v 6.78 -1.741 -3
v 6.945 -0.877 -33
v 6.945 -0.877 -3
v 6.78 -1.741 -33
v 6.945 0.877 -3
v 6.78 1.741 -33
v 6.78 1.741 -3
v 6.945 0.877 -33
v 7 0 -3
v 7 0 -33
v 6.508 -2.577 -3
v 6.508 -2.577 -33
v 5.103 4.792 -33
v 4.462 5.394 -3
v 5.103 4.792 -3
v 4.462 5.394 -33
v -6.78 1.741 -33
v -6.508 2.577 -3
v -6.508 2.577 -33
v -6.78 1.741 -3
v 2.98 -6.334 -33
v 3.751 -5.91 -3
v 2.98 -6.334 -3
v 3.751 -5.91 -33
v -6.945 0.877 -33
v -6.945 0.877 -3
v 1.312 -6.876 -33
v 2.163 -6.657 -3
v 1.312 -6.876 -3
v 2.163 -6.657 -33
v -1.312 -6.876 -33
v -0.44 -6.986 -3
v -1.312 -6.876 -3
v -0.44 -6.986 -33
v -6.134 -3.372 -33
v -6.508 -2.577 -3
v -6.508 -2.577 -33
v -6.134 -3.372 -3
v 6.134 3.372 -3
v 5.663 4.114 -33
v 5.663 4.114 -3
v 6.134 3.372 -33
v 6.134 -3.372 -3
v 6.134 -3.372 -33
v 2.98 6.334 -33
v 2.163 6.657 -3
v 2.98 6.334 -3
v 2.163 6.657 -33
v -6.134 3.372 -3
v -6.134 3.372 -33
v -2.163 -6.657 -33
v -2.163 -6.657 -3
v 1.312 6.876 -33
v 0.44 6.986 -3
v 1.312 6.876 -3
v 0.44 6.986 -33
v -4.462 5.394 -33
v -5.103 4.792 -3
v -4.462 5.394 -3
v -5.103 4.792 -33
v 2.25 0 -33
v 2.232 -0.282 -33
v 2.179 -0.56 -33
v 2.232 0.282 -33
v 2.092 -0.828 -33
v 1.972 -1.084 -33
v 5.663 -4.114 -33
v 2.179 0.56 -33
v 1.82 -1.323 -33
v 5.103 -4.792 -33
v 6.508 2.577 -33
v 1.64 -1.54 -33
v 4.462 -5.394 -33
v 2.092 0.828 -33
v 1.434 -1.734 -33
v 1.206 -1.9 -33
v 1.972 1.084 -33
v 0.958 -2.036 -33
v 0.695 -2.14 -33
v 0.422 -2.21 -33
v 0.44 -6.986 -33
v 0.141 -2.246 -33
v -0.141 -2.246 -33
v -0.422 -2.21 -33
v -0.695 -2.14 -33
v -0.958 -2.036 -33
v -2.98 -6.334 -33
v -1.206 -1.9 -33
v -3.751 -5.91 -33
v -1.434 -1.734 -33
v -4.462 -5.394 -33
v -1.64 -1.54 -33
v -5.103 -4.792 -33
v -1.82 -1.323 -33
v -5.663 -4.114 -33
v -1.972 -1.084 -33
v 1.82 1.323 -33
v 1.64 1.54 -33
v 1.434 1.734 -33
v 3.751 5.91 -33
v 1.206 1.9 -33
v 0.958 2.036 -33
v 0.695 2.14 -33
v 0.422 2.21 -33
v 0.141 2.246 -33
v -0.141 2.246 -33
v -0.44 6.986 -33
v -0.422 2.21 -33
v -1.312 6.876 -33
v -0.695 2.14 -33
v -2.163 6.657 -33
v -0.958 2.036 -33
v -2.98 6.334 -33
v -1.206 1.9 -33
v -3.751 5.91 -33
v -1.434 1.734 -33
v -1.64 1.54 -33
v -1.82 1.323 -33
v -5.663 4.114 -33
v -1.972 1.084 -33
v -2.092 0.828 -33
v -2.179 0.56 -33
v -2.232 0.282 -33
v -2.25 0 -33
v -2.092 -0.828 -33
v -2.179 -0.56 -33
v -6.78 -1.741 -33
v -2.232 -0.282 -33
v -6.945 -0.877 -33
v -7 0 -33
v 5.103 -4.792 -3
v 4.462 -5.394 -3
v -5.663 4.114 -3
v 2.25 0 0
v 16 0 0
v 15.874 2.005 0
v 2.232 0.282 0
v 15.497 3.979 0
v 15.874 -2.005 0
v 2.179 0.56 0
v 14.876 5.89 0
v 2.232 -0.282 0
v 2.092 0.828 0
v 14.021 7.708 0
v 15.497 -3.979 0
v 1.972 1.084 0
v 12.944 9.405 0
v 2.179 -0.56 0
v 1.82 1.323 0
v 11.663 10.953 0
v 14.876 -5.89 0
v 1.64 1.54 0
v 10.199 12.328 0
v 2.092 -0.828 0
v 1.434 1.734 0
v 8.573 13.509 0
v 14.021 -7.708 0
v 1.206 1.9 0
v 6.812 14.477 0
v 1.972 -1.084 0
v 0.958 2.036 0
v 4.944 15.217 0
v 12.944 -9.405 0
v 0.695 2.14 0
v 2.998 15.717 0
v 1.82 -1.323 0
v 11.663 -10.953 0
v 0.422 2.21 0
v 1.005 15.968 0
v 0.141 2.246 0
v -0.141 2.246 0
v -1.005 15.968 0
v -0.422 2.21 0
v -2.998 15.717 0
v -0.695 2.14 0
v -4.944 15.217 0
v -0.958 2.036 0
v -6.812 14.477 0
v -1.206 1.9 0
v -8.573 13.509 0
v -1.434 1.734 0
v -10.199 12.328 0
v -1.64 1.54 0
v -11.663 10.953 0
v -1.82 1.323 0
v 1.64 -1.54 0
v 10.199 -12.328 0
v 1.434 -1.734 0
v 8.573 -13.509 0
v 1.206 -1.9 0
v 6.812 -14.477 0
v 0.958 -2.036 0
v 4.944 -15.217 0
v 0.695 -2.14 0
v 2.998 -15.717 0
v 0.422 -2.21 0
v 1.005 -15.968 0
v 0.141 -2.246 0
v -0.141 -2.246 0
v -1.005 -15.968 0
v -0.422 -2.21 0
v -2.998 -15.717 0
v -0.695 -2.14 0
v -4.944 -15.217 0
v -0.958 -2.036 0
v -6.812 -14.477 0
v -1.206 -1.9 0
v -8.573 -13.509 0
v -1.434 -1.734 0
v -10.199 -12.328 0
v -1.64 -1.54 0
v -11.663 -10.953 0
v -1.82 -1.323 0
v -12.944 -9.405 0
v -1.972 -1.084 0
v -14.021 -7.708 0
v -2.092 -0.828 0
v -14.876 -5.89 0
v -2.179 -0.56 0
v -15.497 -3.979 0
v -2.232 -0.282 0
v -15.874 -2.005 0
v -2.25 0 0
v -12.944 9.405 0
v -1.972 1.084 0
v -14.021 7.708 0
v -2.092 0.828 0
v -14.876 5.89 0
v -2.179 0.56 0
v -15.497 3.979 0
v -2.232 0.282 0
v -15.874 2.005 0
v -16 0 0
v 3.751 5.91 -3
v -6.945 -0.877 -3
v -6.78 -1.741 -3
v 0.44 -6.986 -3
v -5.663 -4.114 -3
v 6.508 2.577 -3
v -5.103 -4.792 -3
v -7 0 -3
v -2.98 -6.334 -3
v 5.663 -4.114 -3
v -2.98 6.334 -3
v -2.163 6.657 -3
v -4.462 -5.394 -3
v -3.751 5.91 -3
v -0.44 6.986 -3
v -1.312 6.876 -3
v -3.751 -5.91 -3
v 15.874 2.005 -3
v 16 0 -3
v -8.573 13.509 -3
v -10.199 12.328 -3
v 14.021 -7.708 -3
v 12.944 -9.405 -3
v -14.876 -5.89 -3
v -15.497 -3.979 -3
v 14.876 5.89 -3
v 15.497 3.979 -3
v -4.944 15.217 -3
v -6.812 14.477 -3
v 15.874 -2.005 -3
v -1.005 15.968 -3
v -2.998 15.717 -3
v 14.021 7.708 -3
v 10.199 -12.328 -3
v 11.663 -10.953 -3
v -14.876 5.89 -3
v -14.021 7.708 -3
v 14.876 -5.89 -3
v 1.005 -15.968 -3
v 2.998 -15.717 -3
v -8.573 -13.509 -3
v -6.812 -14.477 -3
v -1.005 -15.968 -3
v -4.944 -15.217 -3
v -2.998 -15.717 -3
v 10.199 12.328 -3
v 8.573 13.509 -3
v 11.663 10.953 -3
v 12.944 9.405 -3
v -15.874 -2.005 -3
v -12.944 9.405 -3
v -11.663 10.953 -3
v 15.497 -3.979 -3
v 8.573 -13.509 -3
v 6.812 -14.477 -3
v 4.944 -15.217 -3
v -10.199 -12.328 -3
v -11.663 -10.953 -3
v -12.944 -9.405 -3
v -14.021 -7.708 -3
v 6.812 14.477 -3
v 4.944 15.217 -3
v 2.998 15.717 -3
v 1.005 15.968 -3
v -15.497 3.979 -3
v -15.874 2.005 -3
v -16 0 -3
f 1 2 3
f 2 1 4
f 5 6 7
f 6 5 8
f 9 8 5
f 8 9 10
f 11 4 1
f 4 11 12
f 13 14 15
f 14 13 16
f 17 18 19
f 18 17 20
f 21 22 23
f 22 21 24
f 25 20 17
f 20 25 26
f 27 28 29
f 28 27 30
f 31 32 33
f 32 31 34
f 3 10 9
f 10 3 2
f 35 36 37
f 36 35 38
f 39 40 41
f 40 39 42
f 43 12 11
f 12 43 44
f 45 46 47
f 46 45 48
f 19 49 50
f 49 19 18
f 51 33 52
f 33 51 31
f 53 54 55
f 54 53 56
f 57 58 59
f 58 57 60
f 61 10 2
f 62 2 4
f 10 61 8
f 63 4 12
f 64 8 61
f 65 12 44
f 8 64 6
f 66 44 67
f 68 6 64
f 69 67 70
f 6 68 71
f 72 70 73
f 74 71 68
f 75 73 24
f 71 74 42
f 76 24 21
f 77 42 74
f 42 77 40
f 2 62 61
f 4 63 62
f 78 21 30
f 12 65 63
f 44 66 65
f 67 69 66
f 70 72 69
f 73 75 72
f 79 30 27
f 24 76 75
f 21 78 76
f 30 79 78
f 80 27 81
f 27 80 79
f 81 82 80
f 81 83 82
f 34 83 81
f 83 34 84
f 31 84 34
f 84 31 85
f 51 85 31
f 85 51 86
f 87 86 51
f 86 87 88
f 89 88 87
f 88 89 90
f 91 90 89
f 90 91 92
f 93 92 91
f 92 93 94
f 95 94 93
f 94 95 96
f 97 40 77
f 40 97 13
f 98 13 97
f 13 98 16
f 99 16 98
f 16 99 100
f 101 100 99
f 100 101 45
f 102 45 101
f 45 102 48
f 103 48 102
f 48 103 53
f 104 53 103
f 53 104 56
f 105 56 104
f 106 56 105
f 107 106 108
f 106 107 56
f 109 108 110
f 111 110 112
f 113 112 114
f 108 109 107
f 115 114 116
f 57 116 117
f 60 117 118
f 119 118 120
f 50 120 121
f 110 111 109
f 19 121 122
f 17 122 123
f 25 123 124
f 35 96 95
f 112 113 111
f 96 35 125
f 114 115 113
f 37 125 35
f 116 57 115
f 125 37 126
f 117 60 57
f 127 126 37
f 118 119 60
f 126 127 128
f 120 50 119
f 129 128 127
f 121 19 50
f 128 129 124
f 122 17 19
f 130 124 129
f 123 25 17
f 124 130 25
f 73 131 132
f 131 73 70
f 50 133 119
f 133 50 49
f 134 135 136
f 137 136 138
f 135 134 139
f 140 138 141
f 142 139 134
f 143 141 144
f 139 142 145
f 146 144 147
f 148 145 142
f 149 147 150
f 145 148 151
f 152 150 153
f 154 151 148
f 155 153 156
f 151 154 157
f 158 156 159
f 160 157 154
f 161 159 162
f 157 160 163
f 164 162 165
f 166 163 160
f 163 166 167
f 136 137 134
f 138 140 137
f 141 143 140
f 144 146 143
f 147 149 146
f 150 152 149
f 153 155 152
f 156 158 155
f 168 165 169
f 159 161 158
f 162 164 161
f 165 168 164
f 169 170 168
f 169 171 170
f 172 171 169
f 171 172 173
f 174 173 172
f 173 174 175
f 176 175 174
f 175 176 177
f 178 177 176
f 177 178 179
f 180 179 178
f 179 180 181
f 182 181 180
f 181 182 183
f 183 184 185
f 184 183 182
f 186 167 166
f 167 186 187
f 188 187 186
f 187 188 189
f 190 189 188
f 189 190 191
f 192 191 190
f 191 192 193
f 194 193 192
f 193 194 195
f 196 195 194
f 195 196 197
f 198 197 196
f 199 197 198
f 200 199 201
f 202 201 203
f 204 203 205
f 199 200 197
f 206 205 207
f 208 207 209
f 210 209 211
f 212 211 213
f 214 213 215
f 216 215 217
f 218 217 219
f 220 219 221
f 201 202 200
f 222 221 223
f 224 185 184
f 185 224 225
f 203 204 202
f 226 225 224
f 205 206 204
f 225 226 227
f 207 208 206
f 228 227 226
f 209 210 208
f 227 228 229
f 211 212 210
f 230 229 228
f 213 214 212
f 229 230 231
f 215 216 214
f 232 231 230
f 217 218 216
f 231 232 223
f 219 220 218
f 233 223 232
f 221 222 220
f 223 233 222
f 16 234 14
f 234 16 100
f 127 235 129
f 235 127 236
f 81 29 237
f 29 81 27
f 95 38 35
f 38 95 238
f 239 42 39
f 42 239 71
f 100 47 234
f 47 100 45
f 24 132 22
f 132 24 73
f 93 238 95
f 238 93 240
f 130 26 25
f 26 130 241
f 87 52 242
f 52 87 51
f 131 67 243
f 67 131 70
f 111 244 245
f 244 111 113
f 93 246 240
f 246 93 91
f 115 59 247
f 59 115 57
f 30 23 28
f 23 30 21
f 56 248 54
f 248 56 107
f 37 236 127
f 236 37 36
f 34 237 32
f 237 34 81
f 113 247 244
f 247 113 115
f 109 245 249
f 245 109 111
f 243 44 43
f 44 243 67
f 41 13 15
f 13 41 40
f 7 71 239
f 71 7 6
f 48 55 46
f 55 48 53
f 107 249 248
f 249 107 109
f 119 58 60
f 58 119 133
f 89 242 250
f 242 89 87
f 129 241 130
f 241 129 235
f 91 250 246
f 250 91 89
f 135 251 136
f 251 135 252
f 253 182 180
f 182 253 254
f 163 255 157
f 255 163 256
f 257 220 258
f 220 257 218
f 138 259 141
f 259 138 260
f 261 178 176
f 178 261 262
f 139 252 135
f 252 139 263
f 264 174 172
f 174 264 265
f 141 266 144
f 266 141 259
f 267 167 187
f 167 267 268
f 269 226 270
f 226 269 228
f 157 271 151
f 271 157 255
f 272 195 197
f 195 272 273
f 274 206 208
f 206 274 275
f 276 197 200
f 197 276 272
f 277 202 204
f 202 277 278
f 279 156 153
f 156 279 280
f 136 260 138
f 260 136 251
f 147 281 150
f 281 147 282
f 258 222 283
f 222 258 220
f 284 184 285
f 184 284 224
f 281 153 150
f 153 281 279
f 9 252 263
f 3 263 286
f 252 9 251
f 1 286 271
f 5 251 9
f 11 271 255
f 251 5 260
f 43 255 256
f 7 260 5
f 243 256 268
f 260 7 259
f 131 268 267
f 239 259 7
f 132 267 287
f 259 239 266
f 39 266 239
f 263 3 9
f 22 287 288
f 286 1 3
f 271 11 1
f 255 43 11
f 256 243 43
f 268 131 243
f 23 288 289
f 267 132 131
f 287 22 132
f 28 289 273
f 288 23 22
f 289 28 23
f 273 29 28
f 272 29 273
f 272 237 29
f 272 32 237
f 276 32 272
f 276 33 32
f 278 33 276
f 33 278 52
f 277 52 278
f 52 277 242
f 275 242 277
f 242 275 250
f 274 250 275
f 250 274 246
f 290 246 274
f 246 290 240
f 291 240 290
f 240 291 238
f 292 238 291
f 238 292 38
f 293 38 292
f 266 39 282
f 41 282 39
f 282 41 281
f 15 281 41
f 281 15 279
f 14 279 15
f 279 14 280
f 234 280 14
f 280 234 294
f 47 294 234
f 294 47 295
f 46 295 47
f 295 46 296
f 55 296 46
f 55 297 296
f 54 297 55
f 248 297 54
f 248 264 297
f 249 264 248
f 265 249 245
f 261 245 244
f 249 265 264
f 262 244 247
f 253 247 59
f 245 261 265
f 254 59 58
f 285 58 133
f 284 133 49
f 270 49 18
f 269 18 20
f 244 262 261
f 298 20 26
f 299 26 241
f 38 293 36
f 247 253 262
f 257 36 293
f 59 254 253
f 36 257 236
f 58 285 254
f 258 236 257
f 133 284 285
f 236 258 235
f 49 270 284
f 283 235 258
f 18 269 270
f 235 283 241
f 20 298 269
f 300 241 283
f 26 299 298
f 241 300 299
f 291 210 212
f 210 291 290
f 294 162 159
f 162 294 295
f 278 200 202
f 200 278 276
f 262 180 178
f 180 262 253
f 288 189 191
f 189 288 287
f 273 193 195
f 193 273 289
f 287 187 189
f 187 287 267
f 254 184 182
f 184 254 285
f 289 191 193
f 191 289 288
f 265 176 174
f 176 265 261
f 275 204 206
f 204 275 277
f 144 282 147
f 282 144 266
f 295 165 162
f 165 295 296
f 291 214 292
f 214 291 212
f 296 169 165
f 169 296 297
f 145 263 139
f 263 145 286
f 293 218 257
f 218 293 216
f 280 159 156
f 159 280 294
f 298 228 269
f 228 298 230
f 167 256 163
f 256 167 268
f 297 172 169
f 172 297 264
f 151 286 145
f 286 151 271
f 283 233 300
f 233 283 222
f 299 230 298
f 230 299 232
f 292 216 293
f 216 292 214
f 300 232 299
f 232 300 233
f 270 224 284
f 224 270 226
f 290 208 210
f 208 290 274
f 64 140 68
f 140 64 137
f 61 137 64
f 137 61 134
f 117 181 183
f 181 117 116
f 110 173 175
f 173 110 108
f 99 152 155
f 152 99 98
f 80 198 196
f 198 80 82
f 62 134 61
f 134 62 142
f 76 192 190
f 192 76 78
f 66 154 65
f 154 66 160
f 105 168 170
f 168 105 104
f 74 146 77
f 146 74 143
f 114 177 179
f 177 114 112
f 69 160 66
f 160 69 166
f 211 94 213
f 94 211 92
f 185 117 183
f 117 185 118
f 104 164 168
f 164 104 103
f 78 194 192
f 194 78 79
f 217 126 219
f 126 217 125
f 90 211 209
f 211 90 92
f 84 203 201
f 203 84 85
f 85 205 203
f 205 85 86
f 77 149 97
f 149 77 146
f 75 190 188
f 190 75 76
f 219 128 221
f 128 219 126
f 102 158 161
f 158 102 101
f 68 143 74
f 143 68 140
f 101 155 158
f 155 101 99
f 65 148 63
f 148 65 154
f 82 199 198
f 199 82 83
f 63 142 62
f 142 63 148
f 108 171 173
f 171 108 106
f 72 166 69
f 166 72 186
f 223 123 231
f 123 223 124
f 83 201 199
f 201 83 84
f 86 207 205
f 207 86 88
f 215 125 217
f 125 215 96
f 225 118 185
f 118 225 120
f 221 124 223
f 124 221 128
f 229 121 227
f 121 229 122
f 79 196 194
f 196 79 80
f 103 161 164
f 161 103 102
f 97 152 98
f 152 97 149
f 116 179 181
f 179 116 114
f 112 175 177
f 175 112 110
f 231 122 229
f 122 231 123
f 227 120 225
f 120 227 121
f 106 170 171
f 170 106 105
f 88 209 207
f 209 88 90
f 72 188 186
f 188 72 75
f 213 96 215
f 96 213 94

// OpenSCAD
$fn = 50;


difference() {
	union() {
		translate(v = [0, 0, -33.0000000000]) {
			cylinder(h = 33, r = 7.0000000000);
		}
		translate(v = [0, 0, -3.0000000000]) {
			cylinder(h = 3, r = 16.0000000000);
		}
	}
	union() {
		#translate(v = [0, 0, -33]) {
			cylinder(h = 33, r = 2.2500000000);
		}
	}
}
